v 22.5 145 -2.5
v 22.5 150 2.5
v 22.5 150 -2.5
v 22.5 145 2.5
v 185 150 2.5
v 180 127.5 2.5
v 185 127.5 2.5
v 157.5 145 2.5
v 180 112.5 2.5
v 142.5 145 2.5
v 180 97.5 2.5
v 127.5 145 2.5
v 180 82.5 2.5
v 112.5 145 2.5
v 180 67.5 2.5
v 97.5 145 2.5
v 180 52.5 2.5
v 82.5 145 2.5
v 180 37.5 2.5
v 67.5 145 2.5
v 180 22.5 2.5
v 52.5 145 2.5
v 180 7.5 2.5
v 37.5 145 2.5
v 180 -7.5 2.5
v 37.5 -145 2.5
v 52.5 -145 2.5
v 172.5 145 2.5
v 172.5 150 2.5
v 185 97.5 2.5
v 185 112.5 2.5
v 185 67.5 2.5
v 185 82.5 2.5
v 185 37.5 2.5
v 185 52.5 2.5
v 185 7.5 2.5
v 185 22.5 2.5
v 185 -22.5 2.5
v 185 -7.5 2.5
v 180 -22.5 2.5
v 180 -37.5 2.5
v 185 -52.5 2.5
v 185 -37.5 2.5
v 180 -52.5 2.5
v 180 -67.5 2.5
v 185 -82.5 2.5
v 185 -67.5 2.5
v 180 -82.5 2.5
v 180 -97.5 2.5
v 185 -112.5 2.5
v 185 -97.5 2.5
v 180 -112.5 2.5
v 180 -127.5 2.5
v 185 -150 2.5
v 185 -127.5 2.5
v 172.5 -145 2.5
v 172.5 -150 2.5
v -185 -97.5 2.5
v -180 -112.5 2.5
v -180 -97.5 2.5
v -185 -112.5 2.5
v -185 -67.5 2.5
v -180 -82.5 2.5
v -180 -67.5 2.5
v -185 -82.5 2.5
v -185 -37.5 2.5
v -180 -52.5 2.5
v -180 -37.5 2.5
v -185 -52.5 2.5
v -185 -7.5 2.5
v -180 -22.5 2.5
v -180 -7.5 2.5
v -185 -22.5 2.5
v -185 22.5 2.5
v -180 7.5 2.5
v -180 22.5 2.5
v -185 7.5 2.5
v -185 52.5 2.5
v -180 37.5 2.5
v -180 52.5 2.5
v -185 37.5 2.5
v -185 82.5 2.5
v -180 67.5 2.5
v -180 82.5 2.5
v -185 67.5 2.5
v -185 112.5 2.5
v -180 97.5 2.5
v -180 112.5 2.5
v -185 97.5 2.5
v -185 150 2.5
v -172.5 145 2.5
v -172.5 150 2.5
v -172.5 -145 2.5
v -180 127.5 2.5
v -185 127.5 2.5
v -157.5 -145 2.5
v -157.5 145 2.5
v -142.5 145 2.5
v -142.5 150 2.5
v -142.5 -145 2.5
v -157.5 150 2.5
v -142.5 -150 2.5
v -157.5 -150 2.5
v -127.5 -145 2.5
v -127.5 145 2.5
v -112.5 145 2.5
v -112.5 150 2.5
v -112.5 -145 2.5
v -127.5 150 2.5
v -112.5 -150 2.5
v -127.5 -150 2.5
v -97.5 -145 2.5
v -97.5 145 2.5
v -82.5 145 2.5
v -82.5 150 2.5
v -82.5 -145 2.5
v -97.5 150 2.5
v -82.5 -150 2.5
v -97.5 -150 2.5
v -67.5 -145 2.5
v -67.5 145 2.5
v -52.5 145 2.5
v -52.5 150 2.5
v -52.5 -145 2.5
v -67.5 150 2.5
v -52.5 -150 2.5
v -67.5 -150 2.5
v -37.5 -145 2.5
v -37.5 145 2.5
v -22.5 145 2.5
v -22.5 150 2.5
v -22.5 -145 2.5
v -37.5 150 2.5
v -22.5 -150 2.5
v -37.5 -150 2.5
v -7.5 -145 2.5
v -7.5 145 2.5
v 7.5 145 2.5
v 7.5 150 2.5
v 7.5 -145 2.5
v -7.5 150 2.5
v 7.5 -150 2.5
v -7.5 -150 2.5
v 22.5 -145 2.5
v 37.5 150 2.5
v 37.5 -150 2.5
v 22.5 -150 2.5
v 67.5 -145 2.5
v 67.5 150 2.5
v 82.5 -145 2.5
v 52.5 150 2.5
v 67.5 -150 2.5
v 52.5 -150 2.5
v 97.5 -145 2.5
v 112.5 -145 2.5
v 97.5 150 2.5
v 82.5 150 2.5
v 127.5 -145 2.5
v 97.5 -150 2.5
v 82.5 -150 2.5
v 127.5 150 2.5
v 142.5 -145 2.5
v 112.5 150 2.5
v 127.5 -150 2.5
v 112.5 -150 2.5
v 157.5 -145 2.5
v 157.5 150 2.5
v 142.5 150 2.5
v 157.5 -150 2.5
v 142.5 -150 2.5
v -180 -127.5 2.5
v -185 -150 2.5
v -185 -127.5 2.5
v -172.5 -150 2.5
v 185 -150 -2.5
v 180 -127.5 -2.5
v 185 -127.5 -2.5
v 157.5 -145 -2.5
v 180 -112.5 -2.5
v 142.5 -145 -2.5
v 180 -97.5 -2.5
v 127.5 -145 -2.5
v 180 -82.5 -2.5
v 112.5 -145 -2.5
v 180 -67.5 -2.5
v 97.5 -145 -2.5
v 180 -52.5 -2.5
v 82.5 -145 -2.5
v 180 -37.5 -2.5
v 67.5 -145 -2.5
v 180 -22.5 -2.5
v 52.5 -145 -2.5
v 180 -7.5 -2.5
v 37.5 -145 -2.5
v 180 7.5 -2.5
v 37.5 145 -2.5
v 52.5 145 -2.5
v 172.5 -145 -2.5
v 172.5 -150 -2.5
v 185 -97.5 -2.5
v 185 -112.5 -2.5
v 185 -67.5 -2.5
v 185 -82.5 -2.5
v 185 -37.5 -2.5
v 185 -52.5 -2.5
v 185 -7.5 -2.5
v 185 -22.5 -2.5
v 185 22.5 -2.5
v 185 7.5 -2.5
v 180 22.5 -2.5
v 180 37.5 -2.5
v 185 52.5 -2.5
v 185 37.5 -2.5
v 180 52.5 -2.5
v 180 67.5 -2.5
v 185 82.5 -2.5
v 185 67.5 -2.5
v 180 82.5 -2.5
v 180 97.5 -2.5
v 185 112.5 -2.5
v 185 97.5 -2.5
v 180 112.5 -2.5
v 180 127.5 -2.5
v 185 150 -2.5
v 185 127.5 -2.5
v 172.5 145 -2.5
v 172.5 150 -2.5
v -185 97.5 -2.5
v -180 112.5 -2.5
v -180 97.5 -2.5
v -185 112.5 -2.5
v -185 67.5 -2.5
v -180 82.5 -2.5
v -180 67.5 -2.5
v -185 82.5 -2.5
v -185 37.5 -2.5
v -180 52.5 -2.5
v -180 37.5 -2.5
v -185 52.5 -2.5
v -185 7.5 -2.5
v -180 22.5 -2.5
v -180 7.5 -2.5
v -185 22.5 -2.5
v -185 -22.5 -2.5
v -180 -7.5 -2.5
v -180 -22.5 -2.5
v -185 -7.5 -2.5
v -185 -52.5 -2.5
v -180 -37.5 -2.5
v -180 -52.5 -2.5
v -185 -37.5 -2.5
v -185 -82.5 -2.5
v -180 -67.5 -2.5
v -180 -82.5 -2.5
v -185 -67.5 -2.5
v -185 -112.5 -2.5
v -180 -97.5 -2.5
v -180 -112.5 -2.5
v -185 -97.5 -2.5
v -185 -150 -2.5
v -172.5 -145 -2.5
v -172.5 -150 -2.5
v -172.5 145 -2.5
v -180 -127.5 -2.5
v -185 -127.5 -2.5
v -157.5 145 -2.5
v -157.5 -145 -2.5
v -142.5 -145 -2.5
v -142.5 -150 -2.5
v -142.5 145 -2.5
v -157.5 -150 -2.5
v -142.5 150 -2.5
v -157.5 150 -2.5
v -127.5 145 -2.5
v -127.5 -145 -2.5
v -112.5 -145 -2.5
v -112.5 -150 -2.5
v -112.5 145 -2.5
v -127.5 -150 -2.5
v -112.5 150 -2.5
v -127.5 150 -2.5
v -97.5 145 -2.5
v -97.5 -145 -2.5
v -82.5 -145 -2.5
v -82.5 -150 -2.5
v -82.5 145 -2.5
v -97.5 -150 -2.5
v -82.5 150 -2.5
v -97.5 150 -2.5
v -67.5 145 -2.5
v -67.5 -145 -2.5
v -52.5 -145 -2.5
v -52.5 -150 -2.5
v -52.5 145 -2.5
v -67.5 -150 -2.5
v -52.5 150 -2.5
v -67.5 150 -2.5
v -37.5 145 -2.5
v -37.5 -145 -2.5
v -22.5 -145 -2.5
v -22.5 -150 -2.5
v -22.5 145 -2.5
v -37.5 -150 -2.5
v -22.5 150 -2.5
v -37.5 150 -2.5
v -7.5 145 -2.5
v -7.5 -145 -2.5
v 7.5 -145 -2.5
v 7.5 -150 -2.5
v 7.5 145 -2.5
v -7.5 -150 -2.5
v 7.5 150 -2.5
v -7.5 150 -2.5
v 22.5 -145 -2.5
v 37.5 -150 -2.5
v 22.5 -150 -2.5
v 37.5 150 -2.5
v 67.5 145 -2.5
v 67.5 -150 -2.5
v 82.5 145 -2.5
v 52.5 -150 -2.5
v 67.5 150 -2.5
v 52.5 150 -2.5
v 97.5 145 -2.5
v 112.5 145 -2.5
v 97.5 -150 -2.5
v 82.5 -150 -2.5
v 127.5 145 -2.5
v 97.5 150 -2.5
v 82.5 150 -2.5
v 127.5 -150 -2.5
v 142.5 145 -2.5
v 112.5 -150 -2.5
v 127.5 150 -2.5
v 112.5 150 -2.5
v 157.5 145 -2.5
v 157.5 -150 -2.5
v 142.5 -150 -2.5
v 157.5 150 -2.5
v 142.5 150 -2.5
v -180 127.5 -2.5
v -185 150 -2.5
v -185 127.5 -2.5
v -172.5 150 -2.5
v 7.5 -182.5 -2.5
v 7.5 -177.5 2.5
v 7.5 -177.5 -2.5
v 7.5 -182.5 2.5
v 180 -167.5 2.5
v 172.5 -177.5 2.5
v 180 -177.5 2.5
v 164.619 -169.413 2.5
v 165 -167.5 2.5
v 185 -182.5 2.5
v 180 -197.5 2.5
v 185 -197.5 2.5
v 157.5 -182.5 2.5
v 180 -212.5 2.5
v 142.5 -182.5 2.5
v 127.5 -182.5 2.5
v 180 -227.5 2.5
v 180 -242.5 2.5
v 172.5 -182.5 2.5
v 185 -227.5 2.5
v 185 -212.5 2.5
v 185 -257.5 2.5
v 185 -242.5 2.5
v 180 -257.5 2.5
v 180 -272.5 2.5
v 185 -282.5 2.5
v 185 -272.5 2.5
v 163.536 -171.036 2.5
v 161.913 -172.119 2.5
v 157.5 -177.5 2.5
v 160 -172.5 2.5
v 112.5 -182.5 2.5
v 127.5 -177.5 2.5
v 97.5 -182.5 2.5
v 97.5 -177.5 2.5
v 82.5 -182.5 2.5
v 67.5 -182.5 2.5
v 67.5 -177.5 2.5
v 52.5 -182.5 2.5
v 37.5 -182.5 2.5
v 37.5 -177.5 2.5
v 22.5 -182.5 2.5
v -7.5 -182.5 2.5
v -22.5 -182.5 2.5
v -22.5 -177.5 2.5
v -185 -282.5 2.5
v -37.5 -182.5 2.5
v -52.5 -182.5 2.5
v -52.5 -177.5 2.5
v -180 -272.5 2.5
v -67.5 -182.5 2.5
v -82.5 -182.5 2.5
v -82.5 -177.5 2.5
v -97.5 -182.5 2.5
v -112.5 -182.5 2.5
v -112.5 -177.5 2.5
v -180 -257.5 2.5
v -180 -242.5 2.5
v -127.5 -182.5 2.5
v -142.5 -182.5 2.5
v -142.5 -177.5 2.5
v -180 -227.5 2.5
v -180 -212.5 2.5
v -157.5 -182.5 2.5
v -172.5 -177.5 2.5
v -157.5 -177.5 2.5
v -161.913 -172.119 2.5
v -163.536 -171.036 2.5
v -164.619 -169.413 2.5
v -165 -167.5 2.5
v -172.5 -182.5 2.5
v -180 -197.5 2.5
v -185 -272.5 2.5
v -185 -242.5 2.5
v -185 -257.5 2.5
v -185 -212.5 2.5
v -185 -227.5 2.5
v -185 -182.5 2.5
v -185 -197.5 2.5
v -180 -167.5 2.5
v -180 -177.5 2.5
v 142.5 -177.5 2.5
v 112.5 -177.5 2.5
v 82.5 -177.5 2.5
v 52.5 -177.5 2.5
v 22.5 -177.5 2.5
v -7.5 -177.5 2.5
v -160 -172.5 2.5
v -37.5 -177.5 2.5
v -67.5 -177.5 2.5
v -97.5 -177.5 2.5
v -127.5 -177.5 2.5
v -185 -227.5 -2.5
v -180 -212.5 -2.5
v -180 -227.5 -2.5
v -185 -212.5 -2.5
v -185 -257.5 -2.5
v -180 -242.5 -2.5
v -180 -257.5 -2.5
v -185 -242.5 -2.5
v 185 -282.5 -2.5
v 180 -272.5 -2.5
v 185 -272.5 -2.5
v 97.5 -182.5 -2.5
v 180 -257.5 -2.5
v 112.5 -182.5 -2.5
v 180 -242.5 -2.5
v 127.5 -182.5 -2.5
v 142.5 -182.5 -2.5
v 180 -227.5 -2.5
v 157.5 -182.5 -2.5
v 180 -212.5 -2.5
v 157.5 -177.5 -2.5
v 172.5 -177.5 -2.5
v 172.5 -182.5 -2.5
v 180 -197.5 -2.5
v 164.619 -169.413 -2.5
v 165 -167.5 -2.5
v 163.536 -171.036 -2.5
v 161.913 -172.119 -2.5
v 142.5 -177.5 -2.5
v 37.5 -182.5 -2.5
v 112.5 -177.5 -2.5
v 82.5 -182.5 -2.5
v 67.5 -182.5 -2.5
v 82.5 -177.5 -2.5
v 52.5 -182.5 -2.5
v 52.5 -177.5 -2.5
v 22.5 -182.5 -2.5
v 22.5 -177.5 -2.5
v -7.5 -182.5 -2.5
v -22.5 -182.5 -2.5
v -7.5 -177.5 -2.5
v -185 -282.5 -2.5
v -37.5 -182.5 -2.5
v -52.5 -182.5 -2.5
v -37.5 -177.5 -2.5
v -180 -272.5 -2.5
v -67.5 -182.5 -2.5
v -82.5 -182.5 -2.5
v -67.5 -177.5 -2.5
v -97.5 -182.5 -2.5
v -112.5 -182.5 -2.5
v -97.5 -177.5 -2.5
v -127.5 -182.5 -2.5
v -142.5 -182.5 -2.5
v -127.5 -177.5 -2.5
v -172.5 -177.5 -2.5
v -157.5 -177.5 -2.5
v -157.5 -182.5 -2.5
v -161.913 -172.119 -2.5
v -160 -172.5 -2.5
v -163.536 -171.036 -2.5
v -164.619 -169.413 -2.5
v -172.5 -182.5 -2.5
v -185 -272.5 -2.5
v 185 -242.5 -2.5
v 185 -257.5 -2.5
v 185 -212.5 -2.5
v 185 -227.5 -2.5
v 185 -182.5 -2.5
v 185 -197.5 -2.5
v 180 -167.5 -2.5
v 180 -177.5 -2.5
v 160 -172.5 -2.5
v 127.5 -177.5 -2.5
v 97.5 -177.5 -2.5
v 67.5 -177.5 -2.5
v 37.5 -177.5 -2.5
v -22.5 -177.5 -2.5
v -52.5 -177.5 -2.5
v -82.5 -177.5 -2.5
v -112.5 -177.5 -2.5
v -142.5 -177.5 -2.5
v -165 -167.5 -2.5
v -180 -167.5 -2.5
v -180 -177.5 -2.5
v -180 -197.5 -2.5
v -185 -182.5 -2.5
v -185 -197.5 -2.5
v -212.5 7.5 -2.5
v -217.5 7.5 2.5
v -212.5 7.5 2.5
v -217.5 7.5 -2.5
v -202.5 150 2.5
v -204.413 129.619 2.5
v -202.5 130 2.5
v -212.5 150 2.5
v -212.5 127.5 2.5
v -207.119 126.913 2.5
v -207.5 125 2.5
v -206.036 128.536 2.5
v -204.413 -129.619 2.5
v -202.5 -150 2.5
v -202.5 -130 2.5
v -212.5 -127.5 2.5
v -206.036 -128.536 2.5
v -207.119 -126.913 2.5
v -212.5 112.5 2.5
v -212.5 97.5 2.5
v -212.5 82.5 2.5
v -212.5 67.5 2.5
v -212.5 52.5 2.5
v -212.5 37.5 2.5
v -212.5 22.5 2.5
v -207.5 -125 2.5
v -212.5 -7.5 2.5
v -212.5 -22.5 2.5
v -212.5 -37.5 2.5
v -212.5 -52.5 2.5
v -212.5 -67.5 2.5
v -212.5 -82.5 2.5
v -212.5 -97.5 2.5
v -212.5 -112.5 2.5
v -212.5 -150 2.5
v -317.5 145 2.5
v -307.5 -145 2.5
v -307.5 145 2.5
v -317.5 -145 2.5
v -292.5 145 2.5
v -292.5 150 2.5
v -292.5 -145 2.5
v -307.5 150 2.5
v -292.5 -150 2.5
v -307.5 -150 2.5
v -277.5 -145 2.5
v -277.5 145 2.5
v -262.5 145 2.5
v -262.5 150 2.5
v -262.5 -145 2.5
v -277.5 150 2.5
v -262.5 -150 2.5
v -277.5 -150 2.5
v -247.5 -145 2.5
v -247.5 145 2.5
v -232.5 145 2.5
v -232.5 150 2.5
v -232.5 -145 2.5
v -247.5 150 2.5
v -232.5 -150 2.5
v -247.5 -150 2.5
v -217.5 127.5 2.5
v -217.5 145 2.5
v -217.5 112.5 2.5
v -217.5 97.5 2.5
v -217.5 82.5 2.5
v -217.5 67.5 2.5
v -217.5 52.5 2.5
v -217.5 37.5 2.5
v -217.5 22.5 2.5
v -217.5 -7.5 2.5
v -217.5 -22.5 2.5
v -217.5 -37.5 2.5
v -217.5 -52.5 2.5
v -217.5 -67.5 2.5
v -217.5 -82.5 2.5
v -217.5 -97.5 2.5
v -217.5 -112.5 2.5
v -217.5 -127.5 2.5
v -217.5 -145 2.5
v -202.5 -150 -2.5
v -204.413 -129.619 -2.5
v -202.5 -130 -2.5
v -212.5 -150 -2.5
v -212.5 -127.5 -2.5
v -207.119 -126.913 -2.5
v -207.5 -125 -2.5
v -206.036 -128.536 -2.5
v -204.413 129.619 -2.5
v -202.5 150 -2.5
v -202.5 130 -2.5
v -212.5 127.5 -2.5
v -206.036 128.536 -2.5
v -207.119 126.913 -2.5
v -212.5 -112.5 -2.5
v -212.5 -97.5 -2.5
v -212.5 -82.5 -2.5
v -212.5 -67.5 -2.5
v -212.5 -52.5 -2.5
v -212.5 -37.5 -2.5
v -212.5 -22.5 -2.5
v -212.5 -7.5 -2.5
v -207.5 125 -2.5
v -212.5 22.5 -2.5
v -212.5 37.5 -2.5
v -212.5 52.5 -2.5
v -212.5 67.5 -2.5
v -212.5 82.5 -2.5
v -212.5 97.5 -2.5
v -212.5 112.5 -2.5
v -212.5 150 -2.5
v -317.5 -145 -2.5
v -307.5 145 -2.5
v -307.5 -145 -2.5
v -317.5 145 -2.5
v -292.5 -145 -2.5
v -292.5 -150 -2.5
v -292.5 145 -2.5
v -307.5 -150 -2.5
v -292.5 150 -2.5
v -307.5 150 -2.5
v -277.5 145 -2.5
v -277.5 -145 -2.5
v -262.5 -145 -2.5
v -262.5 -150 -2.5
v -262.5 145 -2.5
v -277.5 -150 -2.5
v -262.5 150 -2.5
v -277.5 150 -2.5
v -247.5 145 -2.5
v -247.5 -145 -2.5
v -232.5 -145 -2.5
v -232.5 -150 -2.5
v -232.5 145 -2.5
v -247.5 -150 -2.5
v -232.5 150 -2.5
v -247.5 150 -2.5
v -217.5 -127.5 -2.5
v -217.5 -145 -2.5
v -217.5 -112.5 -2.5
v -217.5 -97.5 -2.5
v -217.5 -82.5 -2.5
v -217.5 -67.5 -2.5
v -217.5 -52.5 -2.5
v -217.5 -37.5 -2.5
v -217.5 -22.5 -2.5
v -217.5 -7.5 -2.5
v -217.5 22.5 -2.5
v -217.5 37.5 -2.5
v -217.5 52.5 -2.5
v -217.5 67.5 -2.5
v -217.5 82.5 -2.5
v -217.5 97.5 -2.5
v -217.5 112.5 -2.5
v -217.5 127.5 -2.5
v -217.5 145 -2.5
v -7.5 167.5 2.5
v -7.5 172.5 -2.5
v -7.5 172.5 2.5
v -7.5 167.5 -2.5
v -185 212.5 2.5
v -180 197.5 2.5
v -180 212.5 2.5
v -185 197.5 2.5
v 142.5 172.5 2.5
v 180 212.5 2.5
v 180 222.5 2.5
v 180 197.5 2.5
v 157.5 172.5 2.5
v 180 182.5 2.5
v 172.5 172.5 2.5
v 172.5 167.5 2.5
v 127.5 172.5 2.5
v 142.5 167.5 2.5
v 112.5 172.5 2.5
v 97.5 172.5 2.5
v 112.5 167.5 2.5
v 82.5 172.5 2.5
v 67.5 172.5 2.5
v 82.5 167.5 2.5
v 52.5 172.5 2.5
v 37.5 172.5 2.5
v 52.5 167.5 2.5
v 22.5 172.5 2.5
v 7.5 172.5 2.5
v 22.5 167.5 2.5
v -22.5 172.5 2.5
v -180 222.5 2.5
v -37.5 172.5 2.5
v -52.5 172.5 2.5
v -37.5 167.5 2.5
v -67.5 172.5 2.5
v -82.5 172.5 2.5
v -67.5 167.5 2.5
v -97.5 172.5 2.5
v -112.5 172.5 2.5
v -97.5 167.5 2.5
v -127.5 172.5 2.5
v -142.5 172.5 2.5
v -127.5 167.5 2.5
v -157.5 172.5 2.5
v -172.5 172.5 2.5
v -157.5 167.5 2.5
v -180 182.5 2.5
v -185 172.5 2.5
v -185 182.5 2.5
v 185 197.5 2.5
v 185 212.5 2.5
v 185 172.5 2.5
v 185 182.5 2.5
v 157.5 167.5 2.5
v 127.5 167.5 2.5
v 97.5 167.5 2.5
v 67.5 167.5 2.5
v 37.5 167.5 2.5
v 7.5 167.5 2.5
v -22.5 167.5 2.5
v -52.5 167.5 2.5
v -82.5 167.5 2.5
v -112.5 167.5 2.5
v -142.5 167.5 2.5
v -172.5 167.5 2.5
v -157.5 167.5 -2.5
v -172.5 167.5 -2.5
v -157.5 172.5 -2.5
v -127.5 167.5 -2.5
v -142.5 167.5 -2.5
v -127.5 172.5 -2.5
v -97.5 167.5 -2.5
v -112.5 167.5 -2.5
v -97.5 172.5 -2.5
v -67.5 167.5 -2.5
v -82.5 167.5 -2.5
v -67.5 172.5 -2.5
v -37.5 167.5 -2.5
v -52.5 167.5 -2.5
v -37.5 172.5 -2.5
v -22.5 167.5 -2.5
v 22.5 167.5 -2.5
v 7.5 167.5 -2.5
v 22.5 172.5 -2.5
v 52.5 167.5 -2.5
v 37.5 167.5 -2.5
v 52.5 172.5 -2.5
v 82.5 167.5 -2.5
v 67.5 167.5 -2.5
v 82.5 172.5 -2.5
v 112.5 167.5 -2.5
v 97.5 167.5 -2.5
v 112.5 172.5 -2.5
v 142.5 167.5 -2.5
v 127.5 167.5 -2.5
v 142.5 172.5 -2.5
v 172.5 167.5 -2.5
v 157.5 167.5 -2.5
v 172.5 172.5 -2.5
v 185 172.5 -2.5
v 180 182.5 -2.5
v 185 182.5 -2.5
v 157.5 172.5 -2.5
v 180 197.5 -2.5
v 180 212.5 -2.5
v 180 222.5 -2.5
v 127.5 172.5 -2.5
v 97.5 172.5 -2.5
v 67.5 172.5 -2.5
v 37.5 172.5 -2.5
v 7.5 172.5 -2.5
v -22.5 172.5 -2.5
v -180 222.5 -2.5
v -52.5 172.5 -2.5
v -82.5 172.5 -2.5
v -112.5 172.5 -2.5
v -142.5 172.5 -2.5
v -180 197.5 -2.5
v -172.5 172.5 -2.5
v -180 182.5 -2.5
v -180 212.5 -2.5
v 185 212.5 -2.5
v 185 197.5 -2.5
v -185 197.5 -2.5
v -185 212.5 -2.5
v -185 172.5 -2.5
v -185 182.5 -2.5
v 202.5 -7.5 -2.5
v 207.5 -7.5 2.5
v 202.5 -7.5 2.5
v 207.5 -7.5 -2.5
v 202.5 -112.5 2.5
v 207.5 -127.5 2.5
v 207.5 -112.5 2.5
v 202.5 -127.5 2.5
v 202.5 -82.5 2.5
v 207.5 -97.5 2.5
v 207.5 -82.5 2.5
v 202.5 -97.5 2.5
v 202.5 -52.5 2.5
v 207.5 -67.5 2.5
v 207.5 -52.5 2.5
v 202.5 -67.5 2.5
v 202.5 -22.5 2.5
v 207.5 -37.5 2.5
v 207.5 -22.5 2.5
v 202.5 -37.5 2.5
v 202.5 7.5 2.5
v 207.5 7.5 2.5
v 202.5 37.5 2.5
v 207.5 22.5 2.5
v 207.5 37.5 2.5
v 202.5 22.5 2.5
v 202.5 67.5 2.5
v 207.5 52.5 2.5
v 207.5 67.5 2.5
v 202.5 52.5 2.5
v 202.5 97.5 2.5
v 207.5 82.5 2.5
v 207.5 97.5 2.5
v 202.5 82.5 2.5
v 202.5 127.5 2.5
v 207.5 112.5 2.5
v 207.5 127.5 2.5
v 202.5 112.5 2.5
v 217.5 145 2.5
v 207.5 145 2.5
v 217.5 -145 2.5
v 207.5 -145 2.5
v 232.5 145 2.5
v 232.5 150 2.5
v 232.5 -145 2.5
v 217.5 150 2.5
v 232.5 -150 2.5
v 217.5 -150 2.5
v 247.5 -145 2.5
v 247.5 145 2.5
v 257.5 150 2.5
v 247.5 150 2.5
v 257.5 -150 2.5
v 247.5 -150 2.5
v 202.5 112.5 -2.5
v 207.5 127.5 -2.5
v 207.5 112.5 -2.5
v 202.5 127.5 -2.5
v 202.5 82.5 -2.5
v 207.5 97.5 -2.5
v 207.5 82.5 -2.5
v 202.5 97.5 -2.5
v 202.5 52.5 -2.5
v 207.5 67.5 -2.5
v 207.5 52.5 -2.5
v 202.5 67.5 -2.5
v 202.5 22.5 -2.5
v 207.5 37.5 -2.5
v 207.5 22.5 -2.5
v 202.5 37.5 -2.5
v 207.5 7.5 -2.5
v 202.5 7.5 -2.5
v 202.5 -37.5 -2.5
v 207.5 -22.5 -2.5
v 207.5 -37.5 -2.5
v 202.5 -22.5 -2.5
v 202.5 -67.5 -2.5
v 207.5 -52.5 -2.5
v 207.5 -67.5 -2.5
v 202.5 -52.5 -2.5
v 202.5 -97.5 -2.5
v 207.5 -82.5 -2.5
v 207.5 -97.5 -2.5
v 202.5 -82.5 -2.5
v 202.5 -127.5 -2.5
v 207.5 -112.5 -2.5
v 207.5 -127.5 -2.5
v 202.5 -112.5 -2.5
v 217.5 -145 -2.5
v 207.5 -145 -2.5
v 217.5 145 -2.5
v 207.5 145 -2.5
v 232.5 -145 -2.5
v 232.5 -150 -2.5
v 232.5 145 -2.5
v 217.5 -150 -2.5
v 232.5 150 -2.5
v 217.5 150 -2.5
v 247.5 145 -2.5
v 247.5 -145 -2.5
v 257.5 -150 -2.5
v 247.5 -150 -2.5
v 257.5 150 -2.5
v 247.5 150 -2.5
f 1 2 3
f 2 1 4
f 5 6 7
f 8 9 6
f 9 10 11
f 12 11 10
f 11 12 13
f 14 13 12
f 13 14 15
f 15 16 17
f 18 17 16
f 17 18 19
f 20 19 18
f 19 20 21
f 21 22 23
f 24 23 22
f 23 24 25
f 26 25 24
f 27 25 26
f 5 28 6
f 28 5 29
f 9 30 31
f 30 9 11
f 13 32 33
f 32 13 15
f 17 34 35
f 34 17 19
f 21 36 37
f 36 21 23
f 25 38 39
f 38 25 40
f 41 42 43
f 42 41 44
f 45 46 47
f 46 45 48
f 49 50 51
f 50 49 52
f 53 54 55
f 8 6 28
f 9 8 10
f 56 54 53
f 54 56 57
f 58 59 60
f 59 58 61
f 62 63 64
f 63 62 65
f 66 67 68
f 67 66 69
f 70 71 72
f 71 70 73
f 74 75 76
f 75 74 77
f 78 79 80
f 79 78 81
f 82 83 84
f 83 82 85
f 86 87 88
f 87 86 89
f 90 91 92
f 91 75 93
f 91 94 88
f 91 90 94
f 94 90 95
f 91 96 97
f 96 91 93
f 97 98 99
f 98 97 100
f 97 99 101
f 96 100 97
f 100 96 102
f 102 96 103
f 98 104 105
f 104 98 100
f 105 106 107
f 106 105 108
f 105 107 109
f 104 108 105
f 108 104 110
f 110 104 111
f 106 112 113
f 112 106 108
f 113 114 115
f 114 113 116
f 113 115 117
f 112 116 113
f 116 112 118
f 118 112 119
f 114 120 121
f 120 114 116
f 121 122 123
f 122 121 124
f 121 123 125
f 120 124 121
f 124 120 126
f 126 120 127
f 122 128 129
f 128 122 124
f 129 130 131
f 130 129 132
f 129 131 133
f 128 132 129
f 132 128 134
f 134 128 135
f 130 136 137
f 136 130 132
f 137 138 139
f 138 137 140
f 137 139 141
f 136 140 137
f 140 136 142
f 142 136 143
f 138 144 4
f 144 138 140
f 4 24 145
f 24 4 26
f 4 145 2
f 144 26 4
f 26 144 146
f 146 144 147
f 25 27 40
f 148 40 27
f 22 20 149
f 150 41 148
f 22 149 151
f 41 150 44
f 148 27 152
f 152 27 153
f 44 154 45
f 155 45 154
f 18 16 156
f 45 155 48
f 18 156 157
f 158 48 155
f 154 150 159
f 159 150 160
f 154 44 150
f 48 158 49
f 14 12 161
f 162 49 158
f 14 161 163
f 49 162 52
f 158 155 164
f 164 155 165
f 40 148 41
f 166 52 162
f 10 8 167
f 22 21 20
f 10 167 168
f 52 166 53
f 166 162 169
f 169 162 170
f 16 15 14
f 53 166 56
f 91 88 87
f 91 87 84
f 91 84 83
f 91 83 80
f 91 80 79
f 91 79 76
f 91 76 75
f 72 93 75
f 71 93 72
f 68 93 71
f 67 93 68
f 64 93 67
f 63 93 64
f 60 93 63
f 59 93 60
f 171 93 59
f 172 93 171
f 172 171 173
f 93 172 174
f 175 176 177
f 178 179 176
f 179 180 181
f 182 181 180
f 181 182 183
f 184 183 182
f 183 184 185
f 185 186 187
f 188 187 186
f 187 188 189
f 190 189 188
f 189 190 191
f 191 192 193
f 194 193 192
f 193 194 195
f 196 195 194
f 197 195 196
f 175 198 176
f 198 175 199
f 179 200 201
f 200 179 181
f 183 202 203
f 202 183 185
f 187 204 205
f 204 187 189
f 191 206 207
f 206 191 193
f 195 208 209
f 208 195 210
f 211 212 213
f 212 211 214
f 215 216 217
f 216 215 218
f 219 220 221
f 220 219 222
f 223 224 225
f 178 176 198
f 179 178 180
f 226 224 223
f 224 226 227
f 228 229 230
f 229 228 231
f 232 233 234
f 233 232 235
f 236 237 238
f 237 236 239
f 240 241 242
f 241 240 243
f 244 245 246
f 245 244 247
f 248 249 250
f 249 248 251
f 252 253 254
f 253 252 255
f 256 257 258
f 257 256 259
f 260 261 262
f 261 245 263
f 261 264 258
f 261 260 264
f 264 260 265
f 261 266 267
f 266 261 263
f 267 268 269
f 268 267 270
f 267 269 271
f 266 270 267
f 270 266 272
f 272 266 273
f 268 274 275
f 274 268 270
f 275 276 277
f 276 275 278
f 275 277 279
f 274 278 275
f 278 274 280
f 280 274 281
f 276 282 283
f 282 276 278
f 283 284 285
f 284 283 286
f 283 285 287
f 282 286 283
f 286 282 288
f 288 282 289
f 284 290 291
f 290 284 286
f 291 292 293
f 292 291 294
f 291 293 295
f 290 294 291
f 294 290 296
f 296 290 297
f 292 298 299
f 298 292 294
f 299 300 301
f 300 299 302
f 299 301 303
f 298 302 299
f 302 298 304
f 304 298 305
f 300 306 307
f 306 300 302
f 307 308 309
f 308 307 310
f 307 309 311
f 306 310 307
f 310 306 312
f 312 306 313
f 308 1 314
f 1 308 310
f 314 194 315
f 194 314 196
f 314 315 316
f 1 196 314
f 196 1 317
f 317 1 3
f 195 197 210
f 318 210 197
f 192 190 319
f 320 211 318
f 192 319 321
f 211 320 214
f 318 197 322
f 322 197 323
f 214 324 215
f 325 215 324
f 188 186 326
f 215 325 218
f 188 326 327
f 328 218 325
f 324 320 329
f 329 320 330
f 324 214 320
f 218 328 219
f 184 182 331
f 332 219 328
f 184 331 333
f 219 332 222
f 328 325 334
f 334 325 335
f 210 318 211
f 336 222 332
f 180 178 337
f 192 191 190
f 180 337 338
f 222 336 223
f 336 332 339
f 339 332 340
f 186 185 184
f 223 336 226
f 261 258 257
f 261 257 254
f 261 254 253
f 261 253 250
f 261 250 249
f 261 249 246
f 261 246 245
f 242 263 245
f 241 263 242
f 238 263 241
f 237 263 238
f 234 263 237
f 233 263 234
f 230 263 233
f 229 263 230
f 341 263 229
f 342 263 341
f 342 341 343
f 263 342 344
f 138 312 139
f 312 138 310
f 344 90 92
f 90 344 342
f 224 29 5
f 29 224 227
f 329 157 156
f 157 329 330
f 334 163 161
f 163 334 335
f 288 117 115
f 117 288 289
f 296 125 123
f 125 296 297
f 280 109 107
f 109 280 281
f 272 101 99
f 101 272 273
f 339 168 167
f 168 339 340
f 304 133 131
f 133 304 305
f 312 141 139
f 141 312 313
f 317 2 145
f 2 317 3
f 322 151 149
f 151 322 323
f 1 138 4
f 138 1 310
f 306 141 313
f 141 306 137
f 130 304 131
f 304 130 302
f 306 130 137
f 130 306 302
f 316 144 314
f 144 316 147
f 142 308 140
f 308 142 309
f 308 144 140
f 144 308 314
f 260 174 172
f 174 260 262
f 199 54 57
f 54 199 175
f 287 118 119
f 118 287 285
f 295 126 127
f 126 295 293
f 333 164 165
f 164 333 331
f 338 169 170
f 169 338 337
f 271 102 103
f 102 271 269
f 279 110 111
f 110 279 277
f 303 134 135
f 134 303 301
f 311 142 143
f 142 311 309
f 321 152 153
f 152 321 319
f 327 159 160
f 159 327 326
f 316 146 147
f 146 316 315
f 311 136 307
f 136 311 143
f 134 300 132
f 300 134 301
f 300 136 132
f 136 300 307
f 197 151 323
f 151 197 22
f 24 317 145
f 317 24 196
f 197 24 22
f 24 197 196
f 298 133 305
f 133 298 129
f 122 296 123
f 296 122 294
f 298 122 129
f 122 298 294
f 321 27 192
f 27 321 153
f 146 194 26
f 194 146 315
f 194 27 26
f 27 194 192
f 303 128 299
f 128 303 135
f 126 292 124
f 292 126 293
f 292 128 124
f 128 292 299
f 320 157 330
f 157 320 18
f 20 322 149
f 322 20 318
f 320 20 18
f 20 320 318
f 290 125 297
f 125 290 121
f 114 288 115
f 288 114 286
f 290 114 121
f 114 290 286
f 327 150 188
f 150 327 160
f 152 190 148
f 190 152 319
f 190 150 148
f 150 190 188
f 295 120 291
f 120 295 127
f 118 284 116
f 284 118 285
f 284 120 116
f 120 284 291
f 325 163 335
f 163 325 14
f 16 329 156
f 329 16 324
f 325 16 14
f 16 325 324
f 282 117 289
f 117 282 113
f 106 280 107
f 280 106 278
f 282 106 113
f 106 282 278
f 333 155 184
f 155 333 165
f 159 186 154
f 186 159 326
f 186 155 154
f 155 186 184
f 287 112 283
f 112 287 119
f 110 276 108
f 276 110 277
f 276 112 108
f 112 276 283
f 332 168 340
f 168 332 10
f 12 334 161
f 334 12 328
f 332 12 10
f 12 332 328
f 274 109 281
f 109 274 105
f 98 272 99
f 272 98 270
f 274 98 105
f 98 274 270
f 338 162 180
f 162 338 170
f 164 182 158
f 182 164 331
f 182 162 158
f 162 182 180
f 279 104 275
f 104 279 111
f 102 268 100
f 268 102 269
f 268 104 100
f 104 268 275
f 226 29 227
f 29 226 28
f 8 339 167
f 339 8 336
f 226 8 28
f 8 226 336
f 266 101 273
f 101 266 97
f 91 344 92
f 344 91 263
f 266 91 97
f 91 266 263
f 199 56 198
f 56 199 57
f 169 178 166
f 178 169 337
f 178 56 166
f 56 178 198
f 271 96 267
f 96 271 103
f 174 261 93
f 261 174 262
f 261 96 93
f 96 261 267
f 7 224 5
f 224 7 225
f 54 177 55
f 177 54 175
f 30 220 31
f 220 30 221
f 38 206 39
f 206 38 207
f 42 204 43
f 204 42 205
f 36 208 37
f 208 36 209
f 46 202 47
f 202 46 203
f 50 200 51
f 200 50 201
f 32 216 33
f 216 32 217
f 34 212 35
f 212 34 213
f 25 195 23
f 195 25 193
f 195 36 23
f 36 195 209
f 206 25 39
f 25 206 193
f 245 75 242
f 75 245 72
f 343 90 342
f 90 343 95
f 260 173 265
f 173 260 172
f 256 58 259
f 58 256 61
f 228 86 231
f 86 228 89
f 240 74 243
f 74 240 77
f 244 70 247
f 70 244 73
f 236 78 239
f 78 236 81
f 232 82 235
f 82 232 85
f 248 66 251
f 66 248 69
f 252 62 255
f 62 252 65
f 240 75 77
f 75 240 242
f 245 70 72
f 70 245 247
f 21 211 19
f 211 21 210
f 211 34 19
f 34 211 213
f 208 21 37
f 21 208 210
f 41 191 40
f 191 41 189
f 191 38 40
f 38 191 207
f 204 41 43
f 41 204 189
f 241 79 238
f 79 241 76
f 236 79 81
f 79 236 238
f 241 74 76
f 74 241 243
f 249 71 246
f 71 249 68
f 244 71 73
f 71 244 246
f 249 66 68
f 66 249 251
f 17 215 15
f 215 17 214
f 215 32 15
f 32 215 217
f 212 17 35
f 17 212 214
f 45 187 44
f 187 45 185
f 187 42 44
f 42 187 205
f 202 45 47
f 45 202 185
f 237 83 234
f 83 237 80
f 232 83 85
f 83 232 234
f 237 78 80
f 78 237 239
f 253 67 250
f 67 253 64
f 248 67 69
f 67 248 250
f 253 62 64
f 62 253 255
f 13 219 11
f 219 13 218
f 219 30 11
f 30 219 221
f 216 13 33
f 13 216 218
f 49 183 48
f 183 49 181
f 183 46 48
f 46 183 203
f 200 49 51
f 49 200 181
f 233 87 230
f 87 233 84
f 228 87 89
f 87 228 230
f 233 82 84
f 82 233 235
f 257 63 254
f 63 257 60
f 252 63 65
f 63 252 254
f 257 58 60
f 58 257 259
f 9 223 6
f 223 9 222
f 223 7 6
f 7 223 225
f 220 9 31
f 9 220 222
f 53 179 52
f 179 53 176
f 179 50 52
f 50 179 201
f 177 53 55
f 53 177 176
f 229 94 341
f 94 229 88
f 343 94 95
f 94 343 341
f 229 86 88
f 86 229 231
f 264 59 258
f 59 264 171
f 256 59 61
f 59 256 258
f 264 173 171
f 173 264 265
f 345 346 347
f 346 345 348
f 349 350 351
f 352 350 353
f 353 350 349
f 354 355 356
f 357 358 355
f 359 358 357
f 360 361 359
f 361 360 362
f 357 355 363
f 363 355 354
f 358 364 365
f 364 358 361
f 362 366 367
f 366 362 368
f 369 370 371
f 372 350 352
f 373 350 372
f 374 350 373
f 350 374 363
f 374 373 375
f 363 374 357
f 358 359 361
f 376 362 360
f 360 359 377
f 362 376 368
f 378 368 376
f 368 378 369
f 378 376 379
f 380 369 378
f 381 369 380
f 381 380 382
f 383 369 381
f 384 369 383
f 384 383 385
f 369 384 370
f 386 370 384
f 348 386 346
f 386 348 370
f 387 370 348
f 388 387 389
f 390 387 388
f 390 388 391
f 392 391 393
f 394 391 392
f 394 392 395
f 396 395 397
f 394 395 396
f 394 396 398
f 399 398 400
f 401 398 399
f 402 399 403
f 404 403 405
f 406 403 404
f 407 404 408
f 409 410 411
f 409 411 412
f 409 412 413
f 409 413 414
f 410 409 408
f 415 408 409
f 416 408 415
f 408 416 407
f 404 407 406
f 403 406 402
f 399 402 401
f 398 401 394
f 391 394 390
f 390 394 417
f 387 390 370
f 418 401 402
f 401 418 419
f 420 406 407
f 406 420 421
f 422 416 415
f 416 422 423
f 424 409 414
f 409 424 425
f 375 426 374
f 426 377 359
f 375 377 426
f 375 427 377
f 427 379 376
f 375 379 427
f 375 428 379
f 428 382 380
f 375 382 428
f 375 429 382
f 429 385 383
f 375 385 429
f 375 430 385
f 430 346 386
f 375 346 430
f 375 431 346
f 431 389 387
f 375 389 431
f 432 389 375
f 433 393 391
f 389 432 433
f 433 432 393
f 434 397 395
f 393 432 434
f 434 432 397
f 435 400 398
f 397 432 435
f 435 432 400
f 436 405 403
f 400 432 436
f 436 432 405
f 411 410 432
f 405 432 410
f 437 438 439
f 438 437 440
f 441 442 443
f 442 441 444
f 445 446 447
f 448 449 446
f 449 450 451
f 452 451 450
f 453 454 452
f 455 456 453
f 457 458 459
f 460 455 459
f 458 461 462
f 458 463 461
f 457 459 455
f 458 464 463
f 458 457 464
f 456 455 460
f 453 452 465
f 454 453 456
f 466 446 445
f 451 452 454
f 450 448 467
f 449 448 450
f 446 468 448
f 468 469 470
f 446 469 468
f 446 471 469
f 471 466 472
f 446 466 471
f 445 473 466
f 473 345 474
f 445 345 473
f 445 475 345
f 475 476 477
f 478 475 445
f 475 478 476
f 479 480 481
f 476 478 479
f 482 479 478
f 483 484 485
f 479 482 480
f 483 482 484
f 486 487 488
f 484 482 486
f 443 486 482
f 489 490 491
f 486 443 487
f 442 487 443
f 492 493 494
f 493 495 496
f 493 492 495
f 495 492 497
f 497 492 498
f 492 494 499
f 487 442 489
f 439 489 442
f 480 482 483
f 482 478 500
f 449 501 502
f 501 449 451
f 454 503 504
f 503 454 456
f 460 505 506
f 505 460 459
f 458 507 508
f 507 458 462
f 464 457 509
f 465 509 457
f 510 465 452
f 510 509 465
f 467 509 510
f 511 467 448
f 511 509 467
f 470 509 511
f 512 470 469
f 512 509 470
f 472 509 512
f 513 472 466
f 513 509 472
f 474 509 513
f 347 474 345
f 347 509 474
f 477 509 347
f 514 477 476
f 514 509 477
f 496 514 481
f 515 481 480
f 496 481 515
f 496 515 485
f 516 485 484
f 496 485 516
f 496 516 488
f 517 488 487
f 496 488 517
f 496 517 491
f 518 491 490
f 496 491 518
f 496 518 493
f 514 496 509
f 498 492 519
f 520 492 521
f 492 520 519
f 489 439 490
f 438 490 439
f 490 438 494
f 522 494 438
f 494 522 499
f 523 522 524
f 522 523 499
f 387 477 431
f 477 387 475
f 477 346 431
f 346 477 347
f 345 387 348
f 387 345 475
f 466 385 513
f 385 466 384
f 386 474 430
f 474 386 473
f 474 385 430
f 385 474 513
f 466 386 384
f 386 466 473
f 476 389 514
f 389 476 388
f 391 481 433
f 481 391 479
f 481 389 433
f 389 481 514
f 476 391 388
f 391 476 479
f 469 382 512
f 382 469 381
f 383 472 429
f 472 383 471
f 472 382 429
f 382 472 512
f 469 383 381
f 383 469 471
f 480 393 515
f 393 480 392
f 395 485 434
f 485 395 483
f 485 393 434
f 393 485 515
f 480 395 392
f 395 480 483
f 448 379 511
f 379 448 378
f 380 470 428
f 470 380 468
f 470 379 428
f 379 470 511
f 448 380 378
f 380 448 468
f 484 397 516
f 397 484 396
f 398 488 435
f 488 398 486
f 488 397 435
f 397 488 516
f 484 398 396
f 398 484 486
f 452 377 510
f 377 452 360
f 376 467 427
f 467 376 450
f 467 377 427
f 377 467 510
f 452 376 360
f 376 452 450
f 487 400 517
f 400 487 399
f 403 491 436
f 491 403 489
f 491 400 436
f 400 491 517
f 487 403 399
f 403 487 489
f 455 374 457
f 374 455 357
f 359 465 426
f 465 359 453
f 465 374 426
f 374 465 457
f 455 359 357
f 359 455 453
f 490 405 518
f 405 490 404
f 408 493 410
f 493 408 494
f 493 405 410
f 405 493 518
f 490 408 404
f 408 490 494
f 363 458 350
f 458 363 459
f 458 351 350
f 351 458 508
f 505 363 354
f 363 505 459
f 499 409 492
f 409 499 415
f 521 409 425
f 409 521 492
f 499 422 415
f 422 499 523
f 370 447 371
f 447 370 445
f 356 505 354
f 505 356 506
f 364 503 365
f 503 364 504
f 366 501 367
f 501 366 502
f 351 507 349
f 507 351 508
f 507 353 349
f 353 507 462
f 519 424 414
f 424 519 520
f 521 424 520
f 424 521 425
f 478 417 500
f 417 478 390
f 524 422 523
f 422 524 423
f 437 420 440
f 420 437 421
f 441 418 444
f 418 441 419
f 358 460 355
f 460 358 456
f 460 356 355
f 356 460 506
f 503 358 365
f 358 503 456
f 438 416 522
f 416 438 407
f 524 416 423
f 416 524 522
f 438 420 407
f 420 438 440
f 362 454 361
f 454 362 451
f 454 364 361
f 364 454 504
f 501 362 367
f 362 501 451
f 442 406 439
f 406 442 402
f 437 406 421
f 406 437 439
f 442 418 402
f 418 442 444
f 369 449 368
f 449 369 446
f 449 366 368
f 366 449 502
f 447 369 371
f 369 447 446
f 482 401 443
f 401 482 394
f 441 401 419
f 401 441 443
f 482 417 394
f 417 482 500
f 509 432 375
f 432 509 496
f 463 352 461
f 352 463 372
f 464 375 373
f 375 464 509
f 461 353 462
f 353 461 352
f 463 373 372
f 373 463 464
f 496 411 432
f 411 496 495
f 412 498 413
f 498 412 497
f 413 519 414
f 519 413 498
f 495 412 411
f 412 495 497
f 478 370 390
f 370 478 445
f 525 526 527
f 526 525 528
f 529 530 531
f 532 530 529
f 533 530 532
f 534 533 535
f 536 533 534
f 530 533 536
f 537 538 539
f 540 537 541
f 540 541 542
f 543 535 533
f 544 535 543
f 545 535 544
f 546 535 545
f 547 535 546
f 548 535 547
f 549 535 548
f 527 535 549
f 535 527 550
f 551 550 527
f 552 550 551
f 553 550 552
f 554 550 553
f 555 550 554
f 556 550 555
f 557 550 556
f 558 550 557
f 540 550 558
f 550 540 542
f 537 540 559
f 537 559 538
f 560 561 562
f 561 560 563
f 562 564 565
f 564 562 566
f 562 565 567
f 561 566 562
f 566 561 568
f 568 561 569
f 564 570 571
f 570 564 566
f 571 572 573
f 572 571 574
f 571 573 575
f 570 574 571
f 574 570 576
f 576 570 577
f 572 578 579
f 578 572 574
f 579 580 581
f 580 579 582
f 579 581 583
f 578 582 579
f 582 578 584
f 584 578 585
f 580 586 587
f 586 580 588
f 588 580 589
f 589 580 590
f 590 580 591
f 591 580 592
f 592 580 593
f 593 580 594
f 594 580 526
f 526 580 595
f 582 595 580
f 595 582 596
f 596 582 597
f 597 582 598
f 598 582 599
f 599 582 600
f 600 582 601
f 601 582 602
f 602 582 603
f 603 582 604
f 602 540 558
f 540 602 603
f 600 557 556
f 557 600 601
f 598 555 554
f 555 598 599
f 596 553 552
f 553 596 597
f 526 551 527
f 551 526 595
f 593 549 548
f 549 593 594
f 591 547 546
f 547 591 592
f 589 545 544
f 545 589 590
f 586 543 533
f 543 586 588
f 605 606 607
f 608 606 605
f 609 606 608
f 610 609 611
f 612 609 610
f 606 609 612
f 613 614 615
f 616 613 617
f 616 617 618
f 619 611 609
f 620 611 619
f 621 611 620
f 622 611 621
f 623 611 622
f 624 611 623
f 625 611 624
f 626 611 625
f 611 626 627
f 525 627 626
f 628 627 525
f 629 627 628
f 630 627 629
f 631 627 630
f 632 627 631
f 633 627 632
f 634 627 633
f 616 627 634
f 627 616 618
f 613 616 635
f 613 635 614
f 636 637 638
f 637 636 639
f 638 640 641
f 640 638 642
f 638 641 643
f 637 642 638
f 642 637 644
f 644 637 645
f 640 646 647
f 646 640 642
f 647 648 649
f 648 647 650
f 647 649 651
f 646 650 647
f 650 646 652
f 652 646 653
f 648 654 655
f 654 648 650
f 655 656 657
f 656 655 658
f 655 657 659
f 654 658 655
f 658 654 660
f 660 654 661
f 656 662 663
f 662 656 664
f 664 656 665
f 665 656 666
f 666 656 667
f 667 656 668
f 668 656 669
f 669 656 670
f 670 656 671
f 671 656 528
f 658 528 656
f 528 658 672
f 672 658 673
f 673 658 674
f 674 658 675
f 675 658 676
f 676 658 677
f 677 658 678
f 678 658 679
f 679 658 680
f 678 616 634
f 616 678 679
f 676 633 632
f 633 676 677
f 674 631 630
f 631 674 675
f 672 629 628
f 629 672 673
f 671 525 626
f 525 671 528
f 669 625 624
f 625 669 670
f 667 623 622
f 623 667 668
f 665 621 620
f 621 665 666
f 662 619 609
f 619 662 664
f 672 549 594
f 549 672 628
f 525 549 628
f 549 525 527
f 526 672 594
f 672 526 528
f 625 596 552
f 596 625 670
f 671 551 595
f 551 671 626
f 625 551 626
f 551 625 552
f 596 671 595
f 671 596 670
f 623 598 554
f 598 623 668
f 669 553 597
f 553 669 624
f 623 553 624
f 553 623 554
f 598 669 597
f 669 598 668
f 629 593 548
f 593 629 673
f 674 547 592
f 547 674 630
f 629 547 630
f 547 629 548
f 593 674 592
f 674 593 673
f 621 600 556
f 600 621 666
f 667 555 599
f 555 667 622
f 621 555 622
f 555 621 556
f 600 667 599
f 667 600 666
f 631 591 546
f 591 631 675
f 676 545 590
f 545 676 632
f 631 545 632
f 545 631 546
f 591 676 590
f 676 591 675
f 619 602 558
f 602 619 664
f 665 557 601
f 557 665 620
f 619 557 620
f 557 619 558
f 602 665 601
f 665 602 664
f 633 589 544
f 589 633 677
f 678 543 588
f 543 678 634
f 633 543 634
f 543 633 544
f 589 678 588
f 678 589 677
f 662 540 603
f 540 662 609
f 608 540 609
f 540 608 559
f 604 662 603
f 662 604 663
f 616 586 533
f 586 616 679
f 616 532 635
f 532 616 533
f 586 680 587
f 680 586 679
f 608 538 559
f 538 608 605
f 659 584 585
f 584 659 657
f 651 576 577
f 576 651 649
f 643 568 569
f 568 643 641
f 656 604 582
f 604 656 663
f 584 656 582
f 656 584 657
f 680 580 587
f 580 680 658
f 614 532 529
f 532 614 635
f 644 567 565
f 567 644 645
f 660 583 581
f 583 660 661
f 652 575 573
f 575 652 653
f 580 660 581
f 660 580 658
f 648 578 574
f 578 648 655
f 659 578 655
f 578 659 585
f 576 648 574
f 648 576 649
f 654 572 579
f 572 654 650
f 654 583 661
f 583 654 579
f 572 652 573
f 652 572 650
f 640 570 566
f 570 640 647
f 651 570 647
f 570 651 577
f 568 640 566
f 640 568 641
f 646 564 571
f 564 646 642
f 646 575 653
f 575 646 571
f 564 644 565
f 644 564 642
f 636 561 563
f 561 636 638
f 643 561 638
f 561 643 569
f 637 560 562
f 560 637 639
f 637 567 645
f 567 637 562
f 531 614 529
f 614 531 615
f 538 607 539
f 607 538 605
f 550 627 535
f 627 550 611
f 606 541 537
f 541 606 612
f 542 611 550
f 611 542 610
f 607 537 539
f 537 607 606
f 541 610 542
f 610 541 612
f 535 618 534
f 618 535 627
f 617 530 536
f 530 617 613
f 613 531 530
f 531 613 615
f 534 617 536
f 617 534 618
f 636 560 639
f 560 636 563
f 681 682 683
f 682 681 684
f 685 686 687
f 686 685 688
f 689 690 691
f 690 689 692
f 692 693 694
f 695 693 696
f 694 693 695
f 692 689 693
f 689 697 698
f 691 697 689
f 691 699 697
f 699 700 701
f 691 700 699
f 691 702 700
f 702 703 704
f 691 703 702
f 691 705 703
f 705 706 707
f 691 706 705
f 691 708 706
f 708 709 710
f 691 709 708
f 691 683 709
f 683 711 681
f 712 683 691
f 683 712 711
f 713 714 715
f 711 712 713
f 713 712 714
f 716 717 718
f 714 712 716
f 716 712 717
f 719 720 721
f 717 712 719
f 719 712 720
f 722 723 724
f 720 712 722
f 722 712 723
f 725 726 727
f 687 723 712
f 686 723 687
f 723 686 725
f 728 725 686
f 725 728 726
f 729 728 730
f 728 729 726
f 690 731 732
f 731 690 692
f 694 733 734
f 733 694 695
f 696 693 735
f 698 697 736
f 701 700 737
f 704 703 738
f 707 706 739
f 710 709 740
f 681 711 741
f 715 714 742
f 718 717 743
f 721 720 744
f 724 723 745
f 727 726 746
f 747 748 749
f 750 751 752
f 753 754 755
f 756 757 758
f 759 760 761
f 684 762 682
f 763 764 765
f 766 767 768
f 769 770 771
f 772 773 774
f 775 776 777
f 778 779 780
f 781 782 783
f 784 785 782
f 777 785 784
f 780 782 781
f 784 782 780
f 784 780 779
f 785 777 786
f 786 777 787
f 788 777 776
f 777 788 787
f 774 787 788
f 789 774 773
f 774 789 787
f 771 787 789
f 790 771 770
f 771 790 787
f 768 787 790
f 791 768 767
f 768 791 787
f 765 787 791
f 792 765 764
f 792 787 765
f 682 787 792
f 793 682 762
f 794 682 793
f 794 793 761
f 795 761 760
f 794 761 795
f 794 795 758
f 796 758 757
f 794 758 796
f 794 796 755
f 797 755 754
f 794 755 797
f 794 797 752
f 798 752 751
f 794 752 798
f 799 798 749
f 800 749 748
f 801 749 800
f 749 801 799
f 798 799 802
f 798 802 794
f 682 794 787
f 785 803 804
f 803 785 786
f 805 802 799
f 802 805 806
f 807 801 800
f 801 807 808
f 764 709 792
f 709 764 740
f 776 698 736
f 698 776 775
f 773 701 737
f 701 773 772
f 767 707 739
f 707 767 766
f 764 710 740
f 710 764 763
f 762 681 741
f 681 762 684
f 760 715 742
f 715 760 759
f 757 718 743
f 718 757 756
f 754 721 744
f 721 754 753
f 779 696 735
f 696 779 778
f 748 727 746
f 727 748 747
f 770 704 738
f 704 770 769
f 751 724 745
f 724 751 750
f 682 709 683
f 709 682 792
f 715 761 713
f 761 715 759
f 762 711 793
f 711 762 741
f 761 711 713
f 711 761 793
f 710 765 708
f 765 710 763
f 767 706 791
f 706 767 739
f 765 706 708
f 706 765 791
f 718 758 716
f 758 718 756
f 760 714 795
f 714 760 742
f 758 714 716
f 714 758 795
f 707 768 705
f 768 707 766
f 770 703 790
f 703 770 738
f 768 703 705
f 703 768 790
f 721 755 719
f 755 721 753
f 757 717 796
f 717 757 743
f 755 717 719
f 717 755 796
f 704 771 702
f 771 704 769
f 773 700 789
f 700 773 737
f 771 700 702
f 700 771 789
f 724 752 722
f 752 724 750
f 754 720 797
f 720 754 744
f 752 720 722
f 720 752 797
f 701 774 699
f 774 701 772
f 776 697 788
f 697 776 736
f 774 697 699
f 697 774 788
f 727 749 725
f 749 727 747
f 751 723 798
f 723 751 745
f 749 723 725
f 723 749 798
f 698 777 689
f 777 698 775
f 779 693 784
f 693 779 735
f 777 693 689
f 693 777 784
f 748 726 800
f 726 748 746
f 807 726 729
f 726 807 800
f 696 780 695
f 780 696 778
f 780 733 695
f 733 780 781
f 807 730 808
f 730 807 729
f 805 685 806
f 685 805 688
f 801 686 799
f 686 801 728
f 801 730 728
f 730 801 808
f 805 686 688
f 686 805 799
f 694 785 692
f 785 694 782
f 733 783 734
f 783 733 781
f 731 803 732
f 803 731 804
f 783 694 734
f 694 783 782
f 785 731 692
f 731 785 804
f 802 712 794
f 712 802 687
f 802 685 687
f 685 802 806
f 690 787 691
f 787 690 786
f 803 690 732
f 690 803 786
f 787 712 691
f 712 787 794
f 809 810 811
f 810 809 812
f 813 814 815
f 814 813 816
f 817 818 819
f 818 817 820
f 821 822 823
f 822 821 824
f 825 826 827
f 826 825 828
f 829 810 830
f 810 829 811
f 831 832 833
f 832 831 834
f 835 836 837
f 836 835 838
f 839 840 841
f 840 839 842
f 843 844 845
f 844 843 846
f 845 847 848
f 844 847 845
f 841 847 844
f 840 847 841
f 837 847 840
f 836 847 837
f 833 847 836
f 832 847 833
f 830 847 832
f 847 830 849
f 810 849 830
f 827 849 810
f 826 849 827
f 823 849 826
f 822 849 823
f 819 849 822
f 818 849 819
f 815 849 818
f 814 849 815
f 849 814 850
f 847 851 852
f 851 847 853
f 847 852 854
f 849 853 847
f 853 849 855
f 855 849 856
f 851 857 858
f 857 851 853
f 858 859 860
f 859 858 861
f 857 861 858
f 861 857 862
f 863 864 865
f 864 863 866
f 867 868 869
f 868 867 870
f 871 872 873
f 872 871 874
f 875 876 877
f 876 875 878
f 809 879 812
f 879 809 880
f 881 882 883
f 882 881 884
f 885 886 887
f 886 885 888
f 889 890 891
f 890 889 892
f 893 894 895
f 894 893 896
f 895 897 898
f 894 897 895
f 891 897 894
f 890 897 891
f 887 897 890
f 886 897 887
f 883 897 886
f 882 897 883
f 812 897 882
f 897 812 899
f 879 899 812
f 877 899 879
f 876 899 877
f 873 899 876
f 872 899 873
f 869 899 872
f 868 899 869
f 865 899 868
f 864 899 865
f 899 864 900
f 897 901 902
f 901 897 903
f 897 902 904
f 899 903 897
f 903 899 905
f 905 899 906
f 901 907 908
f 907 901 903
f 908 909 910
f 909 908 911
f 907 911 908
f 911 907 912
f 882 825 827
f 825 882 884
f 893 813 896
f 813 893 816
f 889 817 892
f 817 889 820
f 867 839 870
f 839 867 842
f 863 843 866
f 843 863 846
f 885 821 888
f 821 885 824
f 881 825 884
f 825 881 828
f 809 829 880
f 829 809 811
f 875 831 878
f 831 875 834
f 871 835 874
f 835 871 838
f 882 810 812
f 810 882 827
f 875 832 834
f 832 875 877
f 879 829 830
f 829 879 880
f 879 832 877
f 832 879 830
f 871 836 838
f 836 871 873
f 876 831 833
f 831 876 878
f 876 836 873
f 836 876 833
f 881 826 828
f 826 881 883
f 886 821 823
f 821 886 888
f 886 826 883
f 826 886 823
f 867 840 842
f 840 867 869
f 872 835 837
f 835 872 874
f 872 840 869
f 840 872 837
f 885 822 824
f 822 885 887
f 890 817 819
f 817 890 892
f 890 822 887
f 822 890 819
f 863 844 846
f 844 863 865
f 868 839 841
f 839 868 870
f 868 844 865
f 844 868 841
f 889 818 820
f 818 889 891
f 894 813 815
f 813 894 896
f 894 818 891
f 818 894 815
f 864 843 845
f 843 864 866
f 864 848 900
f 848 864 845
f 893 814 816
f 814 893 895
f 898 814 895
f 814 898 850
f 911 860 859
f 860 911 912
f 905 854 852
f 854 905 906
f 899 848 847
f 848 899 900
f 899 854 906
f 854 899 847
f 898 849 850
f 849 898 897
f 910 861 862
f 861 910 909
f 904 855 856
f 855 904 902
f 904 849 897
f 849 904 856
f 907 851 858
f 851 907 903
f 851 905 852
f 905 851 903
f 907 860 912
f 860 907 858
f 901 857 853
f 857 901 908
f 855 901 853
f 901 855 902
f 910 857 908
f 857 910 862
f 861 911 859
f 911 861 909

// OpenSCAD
//**********************************************************************************************
// Laurent Le Goff
// GNU GPL v3
// http://www.thingiverse.com/thing:1805411
// member of TyFab fablab  http://tyfab.fr   
//**********************************************************************************************
//        dimension volume interieur
//     
//            _________________            \ \
//        ^  /                /|  ^         \ \
//     P /  /                / |  |          \_\___________
//      v  /________________/  |  |         | \_____________
//        |                 |  |  |          \|_
//        |                 | /|  | H       |\|_|T
//        |_________________|/ |  |          \|_
//     ^  |                 |  |  v         |\|_|
//   H1|  |                 | /              \|_
//     v  |_________________|/                |_|
//     
//        <----------------->     
//                 L
/*[Internal volume (mm)]*/
//Height - Hauteur
H = 150;   // hauteur du volume interieur en mm
//Length - Profondeur
P = 290;   // Profondeur du volume interieur en mm
//Width - Largeur
L = 360;   // Largeur du volume interieur en mm
//Low height - Hauteur de la partie basse
H1= 100;   // hauteur interieur de la partie basse en mm
//Board thickness - Epaisseur de la planche
Ep= 5;     // Epaisseur de la planche en mm
//Lug size
T = 15;  // Taille du tenon en mm
//--------------------------------------------------------------
/*[Options]*/
//Crate or Box - Caisse ou Boite
Boite = 1;  // [0:Crate,1:Box] 
//Close or Open - Fermee ou Ouverte
Ouvert = 1; // [0:Close,1:Open] 
//Foot 
Pied = 1;   // [0:without,1:with] 
//Handle
Poignee = 0;// [0:without,1:with(1*Ep),2:with(2*Ep),3:with(3*Ep)] 
//3D model or board profile
Dxf = 1;    // [0:3D,1:STL,2:DXF(OpenScad only)] 
// 0 -> 3D Model   1 -> board profile STL   2 -> board profil DXF
//--------------------------------------------------------------

/*[Hiden]*/
H2= H-H1;  // hauteur interieur de la partie haute


Lcenter = ((L-T-2*Ep)%(T*4))>=(2*T) ? 1 : 0; 
Pcenter = ((P-T-2*Ep)%(T*4))>=(2*T) ? 1 : 0; 

module fond()
{
    difference() {
        cube([L+2*Ep,P+2*Ep,Ep],center=true);  
        for (i=[Lcenter*T:2*T:L/2-Ep])
        {
           translate([i,P/2+Ep/2,0]) cube([T,Ep,Ep],center=true);
           translate([-i,P/2+Ep/2,0]) cube([T,Ep,Ep],center=true);
           translate([i,-P/2-Ep/2,0]) cube([T,Ep,Ep],center=true);
           translate([-i,-P/2-Ep/2,0]) cube([T,Ep,Ep],center=true);
        }
        for (i=[Pcenter*T:2*T:P/2-Ep])
        {
           translate([L/2+Ep/2,i,0]) cube([Ep,T,Ep],center=true);
           translate([L/2+Ep/2,-i,0]) cube([Ep,T,Ep],center=true);
           translate([-L/2-Ep/2,i,0]) cube([Ep,T,Ep],center=true);
           translate([-L/2-Ep/2,-i,0]) cube([Ep,T,Ep],center=true);
        }
    }
}

module coteb1()
{
    difference() {
        cube([L+2*Ep,H1+Ep+2*Ep*Pied,Ep],center=true);  
        for (i=[Lcenter*T-T:2*T:L/2+Ep])
        {
           translate([i,(H1-2*Ep*Pied)/2,0]) cube([T,Ep,Ep],center=true);
           translate([-i,(H1-2*Ep*Pied)/2,0]) cube([T,Ep,Ep],center=true);
        }
        translate([L/2,(H1-2*Ep*Pied)/2,0]) cube([2*Ep,Ep,Ep],center=true);
        translate([-L/2,(H1-2*Ep*Pied)/2,0]) cube([2*Ep,Ep,Ep],center=true);
        for (i=[(H1+Ep+2*Ep*Pied)/2-T/2:-2*T:-(H1+Ep+2*Ep*Pied)/2-T])
        {
           translate([L/2+Ep/2,i,0]) cube([Ep,T,Ep],center=true);
           translate([-L/2-Ep/2,i,0]) cube([Ep,T,Ep],center=true);
        }
        if (Pied==1)
        {
            translate([0,H1/2+Ep,0]) cube([L-8*Ep,Ep,Ep],center=true);
            translate([L/2-4*Ep,H1/2+3*Ep/2,0]) cylinder(r=Ep,h=Ep,center=true);
            translate([-L/2+4*Ep,H1/2+3*Ep/2,0]) cylinder(r=Ep,h=Ep,center=true);
        }
    }
}

module coteb2()
{
    difference() {
        cube([P+2*Ep,H1+Ep+2*Ep*Pied,Ep],center=true);  
        for (i=[Pcenter*T-T:2*T:P/2+Ep])
        {
           translate([i,(H1-2*Ep*Pied)/2,0]) cube([T,Ep,Ep],center=true);
           translate([-i,(H1-2*Ep*Pied)/2,0]) cube([T,Ep,Ep],center=true);
        }
        translate([P/2,(H1-2*Ep*Pied)/2,0]) cube([2*Ep,Ep,Ep],center=true);
        translate([-P/2,(H1-2*Ep*Pied)/2,0]) cube([2*Ep,Ep,Ep],center=true);
        for (i=[(H1+Ep+2*Ep*Pied)/2-3*T/2:-2*T:-(H1+Ep+2*Ep*Pied)/2-T])
        {
           translate([P/2+Ep/2,i,0]) cube([Ep,T,Ep],center=true);
           translate([-P/2-Ep/2,i,0]) cube([Ep,T,Ep],center=true);
        }
        if (Pied==1)
        {
            translate([0,H1/2+Ep,0]) cube([P-8*Ep,Ep,Ep],center=true);
            translate([P/2-4*Ep,H1/2+3*Ep/2,0]) cylinder(r=Ep,h=Ep,center=true);
            translate([-P/2+4*Ep,H1/2+3*Ep/2,0]) cylinder(r=Ep,h=Ep,center=true);
        }
        if (Poignee!=0)
        {
            translate([0,-(H1+Ep+2*Ep*Pied)/2+Poignee*Ep+15,0]) cube([90,20,Ep],center=true);
            translate([45,-(H1+Ep+2*Ep*Pied)/2+Poignee*Ep+15,0]) cylinder(r=10,h=Ep,center=true);
            translate([-45,-(H1+Ep+2*Ep*Pied)/2+Poignee*Ep+15,0]) cylinder(r=10,h=Ep,center=true);
        }
    }
}

module coteh1()
{
    difference() {
        cube([L+2*Ep,H2+Ep,Ep],center=true);  
        for (i=[Lcenter*T-T:2*T:L/2+Ep])
        {
           translate([i,H2/2,0]) cube([T,Ep,Ep],center=true);
           translate([-i,H2/2,0]) cube([T,Ep,Ep],center=true);
        }
        translate([L/2,H2/2,0]) cube([2*Ep,Ep,Ep],center=true);
        translate([-L/2,H2/2,0]) cube([2*Ep,Ep,Ep],center=true);
        for (i=[(H2+Ep)/2-3*T/2:-2*T:-H2/2-T])
        {
           translate([L/2+Ep/2,i,0]) cube([Ep,T,Ep],center=true);
           translate([-L/2-Ep/2,i,0]) cube([Ep,T,Ep],center=true);
        }
    }
}

module coteh2()
{
    difference() {
        cube([P+2*Ep,H2+Ep,Ep],center=true);  
        for (i=[Pcenter*T-T:2*T:P/2+Ep])
        {
           translate([i,H2/2,0]) cube([T,Ep,Ep],center=true);
           translate([-i,H2/2,0]) cube([T,Ep,Ep],center=true);
        }
        translate([P/2,H2/2,0]) cube([2*Ep,Ep,Ep],center=true);
        translate([-P/2,H2/2,0]) cube([2*Ep,Ep,Ep],center=true);
        for (i=[(H2+Ep)/2-T/2:-2*T:-(H2+Ep)/2])
        {
           translate([P/2+Ep/2,i,0]) cube([Ep,T,Ep],center=true);
           translate([-P/2-Ep/2,i,0]) cube([Ep,T,Ep],center=true);
        }
    }
}

module export_dxf() 
{
    fond();
    translate([0,-P/2-H1/2-3*Ep-T,0]) coteb1();
    rotate([0,0,-90]) translate([0,-L/2-H1/2-3*Ep-T,0]) coteb2();
    if (Boite==1) 
    {
        rotate([0,0,180]) translate([0,-P/2-H2/2-2*Ep-T,0]) coteh1();
        rotate([0,0,90]) translate([0,-L/2-H2/2-2*Ep-T,0]) coteh2();
    }
    else
    {
        rotate([0,0,180]) translate([0,-P/2-H1/2-3*Ep-T,0]) coteb1();
        rotate([0,0,90]) translate([0,-L/2-H1/2-3*Ep-T,0]) coteb2();   
    }
}

module bas()
{
    color("Khaki") translate([0,0,-H1-Ep/2]) fond();
    color("DarkKhaki") translate([0,-P/2-Ep/2,-H1/2-Ep/2-Ep*Pied]) rotate([-90,0,0]) coteb1();
    color("DarkKhaki") translate([0,+P/2+Ep/2,-H1/2-Ep/2-Ep*Pied]) rotate([-90,0,0]) coteb1();
    color("SandyBrown") translate([-L/2-Ep/2,0,-H1/2-Ep/2-Ep*Pied]) rotate([-90,0,90]) coteb2();
    color("SandyBrown") translate([+L/2+Ep/2,0,-H1/2-Ep/2-Ep*Pied]) rotate([-90,0,90]) coteb2();
}

module haut()
{
    color("Khaki") translate([0,0,H2+Ep/2]) fond();
    color("BurlyWood") translate([0,-P/2-Ep/2,H2/2+Ep/2]) rotate([90,0,0]) coteh1();
    color("BurlyWood") translate([0,+P/2+Ep/2,H2/2+Ep/2]) rotate([90,0,0]) coteh1();
    color("SaddleBrown") translate([-L/2-Ep/2,0,H2/2+Ep/2]) rotate([90,0,90]) coteh2();
    color("SaddleBrown") translate([+L/2+Ep/2,0,H2/2+Ep/2]) rotate([90,0,90]) coteh2();
}


if (Dxf==0)
{
    bas();
    if (Boite==1)
        if (Ouvert==0) haut();
        else translate([0,P/2+Ep+1,0]) rotate([-100,0,0]) translate([0,-P/2-Ep-1,0]) haut();
}
if (Dxf==1) export_dxf();
if (Dxf==2) projection(cut = false) export_dxf();
